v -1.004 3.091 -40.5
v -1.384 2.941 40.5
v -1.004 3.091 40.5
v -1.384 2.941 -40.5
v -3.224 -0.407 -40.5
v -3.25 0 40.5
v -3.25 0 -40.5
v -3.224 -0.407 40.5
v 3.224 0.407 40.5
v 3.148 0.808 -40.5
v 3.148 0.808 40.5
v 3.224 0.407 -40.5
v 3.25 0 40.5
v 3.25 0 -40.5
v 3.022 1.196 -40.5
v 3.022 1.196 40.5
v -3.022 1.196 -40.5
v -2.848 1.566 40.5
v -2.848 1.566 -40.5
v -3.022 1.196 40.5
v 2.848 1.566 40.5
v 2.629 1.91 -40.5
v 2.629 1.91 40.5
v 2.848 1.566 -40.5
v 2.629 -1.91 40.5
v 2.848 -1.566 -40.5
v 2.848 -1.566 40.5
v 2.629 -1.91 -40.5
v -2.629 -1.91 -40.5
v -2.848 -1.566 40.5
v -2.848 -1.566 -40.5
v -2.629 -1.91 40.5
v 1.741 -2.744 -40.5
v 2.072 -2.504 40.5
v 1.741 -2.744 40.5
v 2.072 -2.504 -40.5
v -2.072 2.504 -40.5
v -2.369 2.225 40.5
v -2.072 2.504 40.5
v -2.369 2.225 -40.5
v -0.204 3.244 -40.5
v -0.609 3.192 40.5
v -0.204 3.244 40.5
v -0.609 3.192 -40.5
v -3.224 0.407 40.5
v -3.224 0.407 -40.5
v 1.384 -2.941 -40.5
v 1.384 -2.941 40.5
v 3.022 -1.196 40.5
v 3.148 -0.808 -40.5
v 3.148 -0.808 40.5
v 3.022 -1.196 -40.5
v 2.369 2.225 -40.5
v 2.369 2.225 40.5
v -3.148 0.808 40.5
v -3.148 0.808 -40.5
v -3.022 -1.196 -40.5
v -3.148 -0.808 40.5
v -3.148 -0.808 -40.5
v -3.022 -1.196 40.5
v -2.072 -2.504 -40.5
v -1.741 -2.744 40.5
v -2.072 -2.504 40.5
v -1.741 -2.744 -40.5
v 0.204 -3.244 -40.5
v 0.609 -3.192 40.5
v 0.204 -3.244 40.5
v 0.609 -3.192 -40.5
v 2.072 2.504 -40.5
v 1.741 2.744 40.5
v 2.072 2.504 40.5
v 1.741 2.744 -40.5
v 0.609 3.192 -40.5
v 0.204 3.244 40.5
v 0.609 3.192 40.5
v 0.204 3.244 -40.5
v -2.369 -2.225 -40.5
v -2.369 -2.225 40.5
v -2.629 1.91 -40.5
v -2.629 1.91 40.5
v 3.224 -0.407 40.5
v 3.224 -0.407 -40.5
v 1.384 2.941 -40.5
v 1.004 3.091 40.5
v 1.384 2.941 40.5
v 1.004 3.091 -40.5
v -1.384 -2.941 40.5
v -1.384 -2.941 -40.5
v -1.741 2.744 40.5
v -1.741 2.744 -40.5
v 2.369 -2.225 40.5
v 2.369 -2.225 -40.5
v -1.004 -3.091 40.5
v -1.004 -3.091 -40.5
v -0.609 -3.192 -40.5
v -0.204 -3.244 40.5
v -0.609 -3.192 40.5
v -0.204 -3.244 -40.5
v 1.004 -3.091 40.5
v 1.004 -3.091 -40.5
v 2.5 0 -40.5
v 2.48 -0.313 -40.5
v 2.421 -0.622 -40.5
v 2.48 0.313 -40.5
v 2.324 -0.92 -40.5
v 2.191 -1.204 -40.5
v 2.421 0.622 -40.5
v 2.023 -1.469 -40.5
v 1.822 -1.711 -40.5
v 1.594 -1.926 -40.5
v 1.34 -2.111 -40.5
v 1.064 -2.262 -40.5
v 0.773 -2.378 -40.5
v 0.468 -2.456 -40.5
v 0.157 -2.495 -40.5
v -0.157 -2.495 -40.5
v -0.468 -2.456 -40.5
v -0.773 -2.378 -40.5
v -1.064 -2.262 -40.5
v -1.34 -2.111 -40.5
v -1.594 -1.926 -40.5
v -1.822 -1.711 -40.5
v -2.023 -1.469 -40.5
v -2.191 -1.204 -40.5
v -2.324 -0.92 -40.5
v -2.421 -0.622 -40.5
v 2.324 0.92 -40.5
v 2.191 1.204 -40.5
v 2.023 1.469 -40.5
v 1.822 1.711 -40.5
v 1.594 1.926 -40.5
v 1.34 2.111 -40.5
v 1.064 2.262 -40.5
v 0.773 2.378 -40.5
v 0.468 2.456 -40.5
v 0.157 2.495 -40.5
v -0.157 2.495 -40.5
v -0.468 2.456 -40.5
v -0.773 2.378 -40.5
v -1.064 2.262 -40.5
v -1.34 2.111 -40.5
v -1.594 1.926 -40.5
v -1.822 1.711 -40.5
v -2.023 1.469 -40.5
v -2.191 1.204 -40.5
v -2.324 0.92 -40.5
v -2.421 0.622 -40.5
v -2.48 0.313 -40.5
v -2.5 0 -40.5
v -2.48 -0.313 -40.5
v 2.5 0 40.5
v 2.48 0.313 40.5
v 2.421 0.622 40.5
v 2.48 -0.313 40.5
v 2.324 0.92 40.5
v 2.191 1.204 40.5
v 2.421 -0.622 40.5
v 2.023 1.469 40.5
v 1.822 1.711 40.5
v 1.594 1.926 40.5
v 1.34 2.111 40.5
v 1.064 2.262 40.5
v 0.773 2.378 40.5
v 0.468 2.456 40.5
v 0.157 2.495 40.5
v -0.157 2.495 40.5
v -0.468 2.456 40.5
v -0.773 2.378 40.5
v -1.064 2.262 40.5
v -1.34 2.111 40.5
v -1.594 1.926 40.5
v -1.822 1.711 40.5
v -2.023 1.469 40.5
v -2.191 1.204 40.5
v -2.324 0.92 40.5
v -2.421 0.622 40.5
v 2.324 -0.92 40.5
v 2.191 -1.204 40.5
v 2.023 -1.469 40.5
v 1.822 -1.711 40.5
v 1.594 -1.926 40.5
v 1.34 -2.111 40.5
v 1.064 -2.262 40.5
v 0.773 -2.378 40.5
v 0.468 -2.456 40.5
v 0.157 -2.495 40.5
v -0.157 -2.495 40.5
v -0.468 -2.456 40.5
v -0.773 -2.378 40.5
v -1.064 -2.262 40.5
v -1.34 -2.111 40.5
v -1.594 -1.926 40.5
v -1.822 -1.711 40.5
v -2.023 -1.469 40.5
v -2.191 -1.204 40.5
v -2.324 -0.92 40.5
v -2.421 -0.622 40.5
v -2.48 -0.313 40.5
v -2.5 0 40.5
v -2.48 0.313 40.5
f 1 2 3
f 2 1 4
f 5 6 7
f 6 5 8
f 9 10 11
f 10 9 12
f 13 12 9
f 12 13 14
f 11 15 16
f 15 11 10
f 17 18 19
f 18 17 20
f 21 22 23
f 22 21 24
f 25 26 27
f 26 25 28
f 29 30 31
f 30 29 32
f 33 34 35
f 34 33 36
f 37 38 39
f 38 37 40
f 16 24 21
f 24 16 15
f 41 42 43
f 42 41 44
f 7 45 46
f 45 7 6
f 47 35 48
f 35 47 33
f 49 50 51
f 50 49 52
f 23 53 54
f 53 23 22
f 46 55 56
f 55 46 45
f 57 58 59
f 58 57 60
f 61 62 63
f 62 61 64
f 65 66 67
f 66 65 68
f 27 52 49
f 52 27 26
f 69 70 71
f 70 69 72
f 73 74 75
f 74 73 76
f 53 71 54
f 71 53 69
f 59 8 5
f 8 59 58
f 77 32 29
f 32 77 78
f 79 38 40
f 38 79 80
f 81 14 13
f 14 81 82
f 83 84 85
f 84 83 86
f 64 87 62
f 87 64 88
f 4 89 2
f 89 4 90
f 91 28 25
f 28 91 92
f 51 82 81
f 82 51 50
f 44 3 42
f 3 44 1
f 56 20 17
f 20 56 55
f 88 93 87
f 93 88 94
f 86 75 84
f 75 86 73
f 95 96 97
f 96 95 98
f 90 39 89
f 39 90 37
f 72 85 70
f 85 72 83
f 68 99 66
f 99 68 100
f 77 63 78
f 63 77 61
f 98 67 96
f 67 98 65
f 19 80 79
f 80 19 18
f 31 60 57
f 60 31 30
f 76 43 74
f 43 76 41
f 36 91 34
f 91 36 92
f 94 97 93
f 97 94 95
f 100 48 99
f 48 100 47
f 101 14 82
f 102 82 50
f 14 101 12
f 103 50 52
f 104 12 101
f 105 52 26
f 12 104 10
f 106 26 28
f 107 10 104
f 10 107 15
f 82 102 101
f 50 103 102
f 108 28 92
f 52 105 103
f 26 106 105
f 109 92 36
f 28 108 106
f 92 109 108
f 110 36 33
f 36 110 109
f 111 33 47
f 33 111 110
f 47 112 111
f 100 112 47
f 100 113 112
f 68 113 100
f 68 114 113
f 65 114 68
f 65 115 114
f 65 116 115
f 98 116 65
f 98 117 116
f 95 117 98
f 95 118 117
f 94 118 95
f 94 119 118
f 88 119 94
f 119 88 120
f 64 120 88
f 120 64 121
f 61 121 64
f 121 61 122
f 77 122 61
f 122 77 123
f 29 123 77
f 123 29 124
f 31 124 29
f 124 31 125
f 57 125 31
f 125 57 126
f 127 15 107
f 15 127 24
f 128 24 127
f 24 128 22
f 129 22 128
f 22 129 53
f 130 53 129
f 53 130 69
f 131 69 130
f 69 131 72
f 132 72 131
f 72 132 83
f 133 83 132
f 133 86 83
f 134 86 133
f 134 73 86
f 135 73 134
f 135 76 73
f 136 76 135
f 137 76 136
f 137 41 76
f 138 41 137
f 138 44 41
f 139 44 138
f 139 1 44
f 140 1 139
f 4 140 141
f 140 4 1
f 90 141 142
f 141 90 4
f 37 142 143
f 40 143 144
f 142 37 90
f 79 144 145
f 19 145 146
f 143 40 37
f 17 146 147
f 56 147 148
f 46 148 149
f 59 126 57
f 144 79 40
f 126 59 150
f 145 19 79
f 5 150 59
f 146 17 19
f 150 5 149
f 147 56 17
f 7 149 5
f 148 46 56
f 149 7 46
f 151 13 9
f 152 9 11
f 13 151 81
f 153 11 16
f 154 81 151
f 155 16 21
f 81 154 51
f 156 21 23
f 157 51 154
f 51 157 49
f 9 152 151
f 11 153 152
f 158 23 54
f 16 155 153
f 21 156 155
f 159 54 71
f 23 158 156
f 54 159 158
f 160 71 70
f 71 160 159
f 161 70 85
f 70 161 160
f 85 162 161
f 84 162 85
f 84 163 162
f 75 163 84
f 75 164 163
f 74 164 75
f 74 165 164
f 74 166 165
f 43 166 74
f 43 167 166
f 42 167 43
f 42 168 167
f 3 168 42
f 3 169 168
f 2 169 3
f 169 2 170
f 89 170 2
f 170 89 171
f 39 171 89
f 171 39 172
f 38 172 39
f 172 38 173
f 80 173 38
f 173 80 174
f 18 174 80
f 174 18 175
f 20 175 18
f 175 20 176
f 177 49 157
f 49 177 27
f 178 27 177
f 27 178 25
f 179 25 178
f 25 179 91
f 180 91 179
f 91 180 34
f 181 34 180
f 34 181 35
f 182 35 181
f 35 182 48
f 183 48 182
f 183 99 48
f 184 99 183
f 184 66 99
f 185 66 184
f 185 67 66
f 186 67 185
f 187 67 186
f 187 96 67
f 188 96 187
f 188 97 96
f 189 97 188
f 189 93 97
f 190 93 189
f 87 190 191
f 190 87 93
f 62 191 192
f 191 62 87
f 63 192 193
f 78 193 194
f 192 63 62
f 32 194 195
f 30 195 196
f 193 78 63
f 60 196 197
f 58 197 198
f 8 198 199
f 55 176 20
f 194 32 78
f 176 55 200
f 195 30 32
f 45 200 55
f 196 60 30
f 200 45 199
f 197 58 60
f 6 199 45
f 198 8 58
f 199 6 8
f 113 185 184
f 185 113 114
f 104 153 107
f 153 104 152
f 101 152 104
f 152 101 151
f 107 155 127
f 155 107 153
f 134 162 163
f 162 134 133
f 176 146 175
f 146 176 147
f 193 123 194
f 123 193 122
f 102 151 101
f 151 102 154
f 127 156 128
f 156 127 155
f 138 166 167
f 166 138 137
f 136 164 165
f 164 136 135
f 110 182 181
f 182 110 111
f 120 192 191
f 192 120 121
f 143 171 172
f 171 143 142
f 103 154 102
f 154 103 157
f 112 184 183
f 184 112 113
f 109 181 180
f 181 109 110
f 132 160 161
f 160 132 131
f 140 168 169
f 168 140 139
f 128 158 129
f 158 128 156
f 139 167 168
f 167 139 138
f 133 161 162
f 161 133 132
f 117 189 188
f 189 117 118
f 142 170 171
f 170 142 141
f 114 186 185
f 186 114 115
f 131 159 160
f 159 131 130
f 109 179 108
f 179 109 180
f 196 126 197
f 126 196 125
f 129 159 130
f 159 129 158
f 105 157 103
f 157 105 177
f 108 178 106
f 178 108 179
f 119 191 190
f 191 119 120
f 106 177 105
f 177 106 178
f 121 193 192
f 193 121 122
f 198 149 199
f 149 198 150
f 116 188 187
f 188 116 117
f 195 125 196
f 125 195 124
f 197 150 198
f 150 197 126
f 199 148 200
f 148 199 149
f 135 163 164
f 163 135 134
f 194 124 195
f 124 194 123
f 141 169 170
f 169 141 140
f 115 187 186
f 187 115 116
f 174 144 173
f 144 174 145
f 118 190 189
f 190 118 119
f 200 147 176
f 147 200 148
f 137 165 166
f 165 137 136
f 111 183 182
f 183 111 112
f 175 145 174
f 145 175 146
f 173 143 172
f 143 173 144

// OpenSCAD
$fn = 50;


difference() {
	union() {
		translate(v = [0, 0, -40.5000000000]) {
			cylinder(h = 81, r = 3.2500000000);
		}
	}
	union() {
		translate(v = [0, 0, -100.0000000000]) {
			cylinder(h = 200, r = 2.5000000000);
		}
	}
}
